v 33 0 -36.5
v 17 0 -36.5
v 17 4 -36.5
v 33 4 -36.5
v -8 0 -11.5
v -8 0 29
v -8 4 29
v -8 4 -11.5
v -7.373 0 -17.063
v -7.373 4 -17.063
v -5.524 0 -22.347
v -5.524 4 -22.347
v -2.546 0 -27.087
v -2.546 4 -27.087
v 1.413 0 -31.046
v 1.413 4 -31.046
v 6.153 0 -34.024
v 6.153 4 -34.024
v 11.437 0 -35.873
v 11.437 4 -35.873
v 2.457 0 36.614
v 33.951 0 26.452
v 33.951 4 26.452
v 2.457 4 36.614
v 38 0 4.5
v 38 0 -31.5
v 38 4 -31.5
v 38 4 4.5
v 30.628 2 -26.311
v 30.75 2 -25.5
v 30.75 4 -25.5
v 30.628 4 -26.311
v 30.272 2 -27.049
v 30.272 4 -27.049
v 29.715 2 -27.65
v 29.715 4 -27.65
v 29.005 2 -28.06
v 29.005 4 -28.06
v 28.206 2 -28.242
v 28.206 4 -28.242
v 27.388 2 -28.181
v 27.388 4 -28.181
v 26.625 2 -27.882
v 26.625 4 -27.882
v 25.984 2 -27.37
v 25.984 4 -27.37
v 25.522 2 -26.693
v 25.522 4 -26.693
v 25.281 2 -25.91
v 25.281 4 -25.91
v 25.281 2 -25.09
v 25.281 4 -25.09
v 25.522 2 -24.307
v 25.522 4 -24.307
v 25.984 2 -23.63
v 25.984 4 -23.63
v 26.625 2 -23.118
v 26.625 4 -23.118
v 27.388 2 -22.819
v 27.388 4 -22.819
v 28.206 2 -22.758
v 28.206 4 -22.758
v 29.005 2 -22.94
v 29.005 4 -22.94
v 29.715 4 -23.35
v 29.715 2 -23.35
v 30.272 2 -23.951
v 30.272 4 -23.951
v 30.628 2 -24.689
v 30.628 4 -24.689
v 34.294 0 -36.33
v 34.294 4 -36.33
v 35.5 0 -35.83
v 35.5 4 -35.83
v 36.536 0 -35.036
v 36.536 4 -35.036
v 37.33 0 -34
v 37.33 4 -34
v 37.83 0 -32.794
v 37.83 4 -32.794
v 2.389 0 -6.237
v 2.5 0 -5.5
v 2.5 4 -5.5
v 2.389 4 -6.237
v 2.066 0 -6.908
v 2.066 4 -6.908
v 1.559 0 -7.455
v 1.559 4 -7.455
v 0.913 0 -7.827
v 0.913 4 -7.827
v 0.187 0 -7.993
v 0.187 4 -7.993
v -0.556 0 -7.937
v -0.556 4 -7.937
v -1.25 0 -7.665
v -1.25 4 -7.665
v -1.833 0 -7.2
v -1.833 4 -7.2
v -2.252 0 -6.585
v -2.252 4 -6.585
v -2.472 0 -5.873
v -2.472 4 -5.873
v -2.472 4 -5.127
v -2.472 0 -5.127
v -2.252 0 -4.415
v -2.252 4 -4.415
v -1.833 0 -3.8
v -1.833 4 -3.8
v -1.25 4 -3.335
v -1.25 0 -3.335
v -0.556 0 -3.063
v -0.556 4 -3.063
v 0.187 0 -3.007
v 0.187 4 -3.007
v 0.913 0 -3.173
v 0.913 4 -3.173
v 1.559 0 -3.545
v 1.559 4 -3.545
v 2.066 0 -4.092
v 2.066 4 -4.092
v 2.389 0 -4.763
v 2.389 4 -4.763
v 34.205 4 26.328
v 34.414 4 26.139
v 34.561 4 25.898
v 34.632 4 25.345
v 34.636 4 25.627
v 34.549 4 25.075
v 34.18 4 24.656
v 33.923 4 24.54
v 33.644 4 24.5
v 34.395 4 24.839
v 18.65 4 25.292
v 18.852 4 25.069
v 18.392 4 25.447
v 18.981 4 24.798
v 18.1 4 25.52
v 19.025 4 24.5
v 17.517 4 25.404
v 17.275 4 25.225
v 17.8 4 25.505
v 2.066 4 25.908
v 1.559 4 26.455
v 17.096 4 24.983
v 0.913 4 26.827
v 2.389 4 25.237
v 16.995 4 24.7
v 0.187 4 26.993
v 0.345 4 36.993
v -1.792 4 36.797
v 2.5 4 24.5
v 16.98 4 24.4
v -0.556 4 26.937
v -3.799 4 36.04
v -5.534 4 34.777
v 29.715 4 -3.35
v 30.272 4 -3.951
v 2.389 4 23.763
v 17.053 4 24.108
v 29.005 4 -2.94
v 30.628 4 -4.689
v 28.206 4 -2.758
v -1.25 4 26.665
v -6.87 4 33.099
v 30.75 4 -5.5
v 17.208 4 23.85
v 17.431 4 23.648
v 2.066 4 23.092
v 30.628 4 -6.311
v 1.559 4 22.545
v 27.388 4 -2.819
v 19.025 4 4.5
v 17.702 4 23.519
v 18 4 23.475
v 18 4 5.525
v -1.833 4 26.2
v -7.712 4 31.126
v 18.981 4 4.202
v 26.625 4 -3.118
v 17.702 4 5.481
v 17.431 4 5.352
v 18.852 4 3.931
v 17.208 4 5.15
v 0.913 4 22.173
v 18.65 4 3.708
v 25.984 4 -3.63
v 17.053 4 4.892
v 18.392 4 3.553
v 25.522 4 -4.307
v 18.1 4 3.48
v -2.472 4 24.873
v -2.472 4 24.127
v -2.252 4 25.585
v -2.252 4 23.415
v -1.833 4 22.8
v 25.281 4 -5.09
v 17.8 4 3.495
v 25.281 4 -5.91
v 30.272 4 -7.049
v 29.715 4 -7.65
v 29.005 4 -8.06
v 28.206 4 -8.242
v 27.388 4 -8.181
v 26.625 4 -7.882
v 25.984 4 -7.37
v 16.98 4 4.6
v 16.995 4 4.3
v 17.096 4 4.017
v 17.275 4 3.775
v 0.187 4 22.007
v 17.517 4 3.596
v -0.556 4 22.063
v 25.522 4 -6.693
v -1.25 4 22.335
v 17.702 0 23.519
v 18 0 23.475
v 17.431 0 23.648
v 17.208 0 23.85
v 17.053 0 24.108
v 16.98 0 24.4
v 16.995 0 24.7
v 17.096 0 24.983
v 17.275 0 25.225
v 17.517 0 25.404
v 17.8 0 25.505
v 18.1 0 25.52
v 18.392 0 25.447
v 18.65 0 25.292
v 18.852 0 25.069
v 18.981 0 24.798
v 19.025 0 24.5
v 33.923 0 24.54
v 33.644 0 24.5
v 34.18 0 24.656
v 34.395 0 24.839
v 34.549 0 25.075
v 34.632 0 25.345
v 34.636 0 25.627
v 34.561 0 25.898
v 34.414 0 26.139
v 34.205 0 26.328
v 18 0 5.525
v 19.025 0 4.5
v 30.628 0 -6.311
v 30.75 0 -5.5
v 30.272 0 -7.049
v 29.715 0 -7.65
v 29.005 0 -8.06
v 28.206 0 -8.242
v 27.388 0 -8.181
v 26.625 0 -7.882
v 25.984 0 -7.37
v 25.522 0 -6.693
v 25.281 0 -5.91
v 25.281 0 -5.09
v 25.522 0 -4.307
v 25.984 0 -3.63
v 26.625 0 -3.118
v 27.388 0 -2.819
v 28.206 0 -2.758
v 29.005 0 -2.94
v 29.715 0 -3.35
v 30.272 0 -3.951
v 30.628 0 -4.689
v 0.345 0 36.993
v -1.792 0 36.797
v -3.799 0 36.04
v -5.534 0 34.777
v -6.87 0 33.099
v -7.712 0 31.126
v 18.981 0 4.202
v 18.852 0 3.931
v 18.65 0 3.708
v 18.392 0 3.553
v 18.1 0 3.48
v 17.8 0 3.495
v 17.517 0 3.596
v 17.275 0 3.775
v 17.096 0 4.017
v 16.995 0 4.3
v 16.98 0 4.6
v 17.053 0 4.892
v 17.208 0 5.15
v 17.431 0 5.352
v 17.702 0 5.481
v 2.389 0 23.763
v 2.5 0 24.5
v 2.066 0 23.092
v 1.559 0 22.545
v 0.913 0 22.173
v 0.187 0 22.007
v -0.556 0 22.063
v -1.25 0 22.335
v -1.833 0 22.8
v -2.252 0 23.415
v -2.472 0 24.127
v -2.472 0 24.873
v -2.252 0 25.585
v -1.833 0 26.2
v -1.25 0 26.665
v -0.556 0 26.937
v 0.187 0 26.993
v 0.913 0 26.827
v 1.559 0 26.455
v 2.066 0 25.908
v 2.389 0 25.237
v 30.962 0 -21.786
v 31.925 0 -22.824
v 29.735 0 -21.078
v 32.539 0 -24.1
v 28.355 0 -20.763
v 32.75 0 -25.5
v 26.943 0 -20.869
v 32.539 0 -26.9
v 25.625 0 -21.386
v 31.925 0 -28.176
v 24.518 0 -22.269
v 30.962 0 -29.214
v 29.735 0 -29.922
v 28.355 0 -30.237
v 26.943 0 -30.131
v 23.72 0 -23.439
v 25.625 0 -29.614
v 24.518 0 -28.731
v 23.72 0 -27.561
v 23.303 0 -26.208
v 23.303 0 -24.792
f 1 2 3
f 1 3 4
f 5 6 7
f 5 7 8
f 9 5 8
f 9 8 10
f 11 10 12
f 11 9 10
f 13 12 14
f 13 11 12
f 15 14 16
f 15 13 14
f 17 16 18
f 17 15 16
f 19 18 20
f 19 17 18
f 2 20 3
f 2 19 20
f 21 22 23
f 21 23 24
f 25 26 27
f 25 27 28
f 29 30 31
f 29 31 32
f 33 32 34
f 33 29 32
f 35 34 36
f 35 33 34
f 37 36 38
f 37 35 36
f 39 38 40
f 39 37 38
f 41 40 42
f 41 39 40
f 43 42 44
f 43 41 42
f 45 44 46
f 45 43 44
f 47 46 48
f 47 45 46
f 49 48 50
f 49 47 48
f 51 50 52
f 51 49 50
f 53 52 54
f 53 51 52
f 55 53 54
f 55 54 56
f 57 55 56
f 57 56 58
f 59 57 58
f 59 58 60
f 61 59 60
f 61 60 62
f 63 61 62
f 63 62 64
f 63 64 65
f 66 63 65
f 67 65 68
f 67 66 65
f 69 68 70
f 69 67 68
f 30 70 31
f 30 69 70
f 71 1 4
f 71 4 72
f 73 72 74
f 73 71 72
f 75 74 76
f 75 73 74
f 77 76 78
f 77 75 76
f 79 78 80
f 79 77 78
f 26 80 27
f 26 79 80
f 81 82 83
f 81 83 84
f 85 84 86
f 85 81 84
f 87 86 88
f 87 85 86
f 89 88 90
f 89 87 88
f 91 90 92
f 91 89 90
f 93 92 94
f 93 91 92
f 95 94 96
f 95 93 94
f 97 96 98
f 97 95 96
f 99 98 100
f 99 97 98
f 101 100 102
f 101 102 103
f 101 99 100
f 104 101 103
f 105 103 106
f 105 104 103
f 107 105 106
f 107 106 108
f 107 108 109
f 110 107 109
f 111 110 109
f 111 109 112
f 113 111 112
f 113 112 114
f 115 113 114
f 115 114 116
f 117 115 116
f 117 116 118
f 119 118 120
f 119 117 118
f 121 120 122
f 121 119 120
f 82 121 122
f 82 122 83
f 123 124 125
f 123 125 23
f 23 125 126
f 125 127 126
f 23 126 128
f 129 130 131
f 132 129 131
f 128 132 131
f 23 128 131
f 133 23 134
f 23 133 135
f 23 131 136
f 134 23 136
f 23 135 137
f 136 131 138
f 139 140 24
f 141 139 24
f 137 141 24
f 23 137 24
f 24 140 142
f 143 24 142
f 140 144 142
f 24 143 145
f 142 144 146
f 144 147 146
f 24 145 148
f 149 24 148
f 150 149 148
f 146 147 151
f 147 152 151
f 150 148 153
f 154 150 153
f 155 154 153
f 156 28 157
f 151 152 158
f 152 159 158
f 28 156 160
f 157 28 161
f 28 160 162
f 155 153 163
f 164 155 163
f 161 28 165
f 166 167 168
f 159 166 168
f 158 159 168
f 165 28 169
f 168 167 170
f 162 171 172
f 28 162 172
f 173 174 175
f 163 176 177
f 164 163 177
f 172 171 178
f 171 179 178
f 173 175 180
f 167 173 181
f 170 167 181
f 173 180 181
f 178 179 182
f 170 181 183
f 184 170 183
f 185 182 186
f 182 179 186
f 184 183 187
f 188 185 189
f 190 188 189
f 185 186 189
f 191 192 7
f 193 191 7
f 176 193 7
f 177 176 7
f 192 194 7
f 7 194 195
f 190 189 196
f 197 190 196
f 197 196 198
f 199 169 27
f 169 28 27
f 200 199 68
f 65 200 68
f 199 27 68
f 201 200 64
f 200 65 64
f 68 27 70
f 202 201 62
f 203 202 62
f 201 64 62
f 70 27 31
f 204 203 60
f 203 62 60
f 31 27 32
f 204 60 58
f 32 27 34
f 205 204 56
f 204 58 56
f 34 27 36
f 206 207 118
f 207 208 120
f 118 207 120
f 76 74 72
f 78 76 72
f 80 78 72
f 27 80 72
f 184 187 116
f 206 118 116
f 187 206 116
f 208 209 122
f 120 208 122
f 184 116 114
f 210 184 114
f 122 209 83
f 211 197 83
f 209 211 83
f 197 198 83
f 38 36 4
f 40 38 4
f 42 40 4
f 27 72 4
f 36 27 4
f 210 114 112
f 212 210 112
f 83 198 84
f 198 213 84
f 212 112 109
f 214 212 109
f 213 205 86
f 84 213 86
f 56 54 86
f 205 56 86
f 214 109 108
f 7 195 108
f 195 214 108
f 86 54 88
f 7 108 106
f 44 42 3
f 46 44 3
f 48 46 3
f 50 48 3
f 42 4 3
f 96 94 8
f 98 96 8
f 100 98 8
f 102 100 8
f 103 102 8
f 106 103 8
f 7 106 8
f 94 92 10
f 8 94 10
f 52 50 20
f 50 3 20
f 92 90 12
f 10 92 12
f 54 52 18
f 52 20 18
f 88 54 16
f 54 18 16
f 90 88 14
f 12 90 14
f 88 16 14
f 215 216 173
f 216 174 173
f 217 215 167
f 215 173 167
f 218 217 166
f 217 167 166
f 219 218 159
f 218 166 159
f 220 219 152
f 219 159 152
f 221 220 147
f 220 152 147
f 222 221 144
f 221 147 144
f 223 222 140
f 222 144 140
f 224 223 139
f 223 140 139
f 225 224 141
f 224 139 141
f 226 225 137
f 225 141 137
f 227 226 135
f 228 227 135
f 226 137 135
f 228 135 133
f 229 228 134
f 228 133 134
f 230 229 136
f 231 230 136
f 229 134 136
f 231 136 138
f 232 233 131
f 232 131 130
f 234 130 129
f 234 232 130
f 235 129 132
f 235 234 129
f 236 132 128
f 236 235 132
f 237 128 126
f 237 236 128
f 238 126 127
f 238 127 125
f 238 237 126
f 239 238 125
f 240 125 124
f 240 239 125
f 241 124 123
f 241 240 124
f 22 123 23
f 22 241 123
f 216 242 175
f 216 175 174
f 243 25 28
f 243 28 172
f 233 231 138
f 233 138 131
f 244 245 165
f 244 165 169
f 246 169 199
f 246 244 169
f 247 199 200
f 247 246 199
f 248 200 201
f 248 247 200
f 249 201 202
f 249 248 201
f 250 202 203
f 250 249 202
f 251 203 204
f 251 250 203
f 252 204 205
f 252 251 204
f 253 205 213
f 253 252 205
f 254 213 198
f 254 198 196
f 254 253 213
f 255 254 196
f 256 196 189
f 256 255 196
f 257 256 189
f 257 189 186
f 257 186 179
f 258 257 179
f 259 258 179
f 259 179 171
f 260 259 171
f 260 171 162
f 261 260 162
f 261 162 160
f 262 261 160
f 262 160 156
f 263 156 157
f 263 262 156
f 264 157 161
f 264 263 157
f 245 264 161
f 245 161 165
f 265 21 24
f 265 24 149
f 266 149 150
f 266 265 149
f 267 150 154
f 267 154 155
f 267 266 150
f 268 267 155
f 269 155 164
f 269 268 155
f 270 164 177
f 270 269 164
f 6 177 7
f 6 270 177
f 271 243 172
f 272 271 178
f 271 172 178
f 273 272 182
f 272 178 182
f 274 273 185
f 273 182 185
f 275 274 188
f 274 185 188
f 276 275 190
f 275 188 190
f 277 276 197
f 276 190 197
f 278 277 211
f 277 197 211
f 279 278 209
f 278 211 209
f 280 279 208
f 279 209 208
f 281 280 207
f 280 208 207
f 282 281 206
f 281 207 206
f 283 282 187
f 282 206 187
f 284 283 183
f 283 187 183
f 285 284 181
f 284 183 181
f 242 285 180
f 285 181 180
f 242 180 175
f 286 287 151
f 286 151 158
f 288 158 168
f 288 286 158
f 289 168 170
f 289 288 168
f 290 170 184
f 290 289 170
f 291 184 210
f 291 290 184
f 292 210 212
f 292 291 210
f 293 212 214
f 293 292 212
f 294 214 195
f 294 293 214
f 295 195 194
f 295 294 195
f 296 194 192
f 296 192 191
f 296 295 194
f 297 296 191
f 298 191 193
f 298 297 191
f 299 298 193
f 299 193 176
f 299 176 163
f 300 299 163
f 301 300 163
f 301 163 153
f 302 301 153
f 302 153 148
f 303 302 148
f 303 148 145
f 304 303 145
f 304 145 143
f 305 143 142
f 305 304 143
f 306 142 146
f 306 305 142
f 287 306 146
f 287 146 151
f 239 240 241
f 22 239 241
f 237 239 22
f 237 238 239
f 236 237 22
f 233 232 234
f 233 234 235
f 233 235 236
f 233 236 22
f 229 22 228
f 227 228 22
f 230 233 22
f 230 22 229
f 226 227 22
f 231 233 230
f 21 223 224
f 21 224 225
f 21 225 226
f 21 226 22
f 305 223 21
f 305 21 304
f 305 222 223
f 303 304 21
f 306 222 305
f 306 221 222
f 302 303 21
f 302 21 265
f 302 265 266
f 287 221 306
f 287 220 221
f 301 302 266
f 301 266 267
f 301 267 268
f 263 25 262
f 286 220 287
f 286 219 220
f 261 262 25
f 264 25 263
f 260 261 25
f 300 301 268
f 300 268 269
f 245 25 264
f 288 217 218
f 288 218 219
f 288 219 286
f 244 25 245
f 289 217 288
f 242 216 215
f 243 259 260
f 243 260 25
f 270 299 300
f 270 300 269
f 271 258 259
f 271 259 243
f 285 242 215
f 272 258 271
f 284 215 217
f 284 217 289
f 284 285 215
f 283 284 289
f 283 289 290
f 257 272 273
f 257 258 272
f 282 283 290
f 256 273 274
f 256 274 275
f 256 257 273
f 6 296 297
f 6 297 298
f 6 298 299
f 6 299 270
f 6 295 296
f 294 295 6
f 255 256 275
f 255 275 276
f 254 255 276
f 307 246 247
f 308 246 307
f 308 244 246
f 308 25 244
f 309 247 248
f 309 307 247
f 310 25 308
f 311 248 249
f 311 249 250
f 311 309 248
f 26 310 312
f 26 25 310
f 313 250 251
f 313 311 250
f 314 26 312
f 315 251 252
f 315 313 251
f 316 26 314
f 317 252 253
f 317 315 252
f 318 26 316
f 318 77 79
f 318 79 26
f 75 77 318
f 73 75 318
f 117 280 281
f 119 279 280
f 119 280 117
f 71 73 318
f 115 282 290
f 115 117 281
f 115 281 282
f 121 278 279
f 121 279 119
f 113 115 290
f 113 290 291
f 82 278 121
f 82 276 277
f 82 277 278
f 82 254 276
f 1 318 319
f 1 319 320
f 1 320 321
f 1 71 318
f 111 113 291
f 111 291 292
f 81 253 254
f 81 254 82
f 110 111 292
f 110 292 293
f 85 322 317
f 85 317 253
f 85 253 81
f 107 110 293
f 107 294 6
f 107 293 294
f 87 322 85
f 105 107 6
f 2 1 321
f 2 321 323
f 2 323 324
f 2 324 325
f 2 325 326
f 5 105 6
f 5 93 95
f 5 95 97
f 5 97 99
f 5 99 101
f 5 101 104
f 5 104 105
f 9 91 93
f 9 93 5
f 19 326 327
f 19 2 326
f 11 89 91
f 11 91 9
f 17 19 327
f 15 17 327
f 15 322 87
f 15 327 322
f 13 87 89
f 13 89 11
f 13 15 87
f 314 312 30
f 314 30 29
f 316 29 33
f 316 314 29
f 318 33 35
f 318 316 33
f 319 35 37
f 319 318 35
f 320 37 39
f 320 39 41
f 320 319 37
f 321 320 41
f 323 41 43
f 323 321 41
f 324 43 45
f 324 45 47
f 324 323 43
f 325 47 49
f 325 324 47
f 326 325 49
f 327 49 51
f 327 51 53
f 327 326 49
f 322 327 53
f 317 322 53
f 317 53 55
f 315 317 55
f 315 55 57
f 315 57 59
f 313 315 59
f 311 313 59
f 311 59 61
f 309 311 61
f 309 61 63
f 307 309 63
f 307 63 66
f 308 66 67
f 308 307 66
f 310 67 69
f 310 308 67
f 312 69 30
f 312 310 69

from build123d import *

# Parameters (mm, degrees)
SKETCH_1_R          = 2.75
SKETCH_1_R_2        = 2.5
EXTRUDE_1_DEPTH     = 4
CHAMFER_2_SIZE      = 2
SKETCH_2_R          = 1.025
CUT_EXTRUDE_1_DEPTH = 5


with BuildPart() as part:
    # 草图1 → 凸台-拉伸1 (new body)
    with BuildSketch(Plane(origin=(0, 0, 0), x_dir=(1, 0, 0), z_dir=(0, 1, 0))):
        with BuildLine():
            Line((38, -4.5), (18, -4.5))
            Line((18, -4.5), (18, -24.5))
            Line((18, -24.5), (33.644053232, -24.5))
            ThreePointArc((33.644053232, -24.5), (34.63190154, -25.344578889), (33.951118195, -26.451688557))
            Line((33.951118195, -26.451688557), (2.456519701, -36.613508453))
            ThreePointArc((2.456519701, -36.613508453), (-4.708919324, -35.467308467), (-8, -29))
            Line((-8, -29), (-8, 11.5))
            ThreePointArc((-8, 11.5), (-0.67766953, 29.17766953), (17, 36.5))
            Line((17, 36.5), (33, 36.5))
            ThreePointArc((33, 36.5), (36.535533906, 35.035533906), (38, 31.5))
            Line((38, 31.5), (38, -4.5))
        make_face()
        with Locations((28, 5.5)):
            Circle(SKETCH_1_R, mode=Mode.SUBTRACT)
        with Locations((28, 25.5)):
            Circle(SKETCH_1_R, mode=Mode.SUBTRACT)
        with Locations((0, 5.5)):
            Circle(SKETCH_1_R_2, mode=Mode.SUBTRACT)
        with Locations((0, -24.5)):
            Circle(SKETCH_1_R_2, mode=Mode.SUBTRACT)
    extrude(amount=EXTRUDE_1_DEPTH)

    # 倒角2
    chamfer_2_edges = [part.edges().sort_by_distance(p)[0] for p in [
        (25.25, 0, -25.5),
    ]]
    chamfer(chamfer_2_edges, length=CHAMFER_2_SIZE)

    # 草图2 → 切除-拉伸1 (cut, symmetric)
    with BuildSketch(Plane(origin=(0, 4, 0), x_dir=(1, 0, 0), z_dir=(0, 1, 0))):
        with Locations((18, -4.5)):
            Circle(SKETCH_2_R)
        with Locations((18, -24.5)):
            Circle(SKETCH_2_R)
    extrude(amount=CUT_EXTRUDE_1_DEPTH, both=True, mode=Mode.SUBTRACT)


solid = part.part
